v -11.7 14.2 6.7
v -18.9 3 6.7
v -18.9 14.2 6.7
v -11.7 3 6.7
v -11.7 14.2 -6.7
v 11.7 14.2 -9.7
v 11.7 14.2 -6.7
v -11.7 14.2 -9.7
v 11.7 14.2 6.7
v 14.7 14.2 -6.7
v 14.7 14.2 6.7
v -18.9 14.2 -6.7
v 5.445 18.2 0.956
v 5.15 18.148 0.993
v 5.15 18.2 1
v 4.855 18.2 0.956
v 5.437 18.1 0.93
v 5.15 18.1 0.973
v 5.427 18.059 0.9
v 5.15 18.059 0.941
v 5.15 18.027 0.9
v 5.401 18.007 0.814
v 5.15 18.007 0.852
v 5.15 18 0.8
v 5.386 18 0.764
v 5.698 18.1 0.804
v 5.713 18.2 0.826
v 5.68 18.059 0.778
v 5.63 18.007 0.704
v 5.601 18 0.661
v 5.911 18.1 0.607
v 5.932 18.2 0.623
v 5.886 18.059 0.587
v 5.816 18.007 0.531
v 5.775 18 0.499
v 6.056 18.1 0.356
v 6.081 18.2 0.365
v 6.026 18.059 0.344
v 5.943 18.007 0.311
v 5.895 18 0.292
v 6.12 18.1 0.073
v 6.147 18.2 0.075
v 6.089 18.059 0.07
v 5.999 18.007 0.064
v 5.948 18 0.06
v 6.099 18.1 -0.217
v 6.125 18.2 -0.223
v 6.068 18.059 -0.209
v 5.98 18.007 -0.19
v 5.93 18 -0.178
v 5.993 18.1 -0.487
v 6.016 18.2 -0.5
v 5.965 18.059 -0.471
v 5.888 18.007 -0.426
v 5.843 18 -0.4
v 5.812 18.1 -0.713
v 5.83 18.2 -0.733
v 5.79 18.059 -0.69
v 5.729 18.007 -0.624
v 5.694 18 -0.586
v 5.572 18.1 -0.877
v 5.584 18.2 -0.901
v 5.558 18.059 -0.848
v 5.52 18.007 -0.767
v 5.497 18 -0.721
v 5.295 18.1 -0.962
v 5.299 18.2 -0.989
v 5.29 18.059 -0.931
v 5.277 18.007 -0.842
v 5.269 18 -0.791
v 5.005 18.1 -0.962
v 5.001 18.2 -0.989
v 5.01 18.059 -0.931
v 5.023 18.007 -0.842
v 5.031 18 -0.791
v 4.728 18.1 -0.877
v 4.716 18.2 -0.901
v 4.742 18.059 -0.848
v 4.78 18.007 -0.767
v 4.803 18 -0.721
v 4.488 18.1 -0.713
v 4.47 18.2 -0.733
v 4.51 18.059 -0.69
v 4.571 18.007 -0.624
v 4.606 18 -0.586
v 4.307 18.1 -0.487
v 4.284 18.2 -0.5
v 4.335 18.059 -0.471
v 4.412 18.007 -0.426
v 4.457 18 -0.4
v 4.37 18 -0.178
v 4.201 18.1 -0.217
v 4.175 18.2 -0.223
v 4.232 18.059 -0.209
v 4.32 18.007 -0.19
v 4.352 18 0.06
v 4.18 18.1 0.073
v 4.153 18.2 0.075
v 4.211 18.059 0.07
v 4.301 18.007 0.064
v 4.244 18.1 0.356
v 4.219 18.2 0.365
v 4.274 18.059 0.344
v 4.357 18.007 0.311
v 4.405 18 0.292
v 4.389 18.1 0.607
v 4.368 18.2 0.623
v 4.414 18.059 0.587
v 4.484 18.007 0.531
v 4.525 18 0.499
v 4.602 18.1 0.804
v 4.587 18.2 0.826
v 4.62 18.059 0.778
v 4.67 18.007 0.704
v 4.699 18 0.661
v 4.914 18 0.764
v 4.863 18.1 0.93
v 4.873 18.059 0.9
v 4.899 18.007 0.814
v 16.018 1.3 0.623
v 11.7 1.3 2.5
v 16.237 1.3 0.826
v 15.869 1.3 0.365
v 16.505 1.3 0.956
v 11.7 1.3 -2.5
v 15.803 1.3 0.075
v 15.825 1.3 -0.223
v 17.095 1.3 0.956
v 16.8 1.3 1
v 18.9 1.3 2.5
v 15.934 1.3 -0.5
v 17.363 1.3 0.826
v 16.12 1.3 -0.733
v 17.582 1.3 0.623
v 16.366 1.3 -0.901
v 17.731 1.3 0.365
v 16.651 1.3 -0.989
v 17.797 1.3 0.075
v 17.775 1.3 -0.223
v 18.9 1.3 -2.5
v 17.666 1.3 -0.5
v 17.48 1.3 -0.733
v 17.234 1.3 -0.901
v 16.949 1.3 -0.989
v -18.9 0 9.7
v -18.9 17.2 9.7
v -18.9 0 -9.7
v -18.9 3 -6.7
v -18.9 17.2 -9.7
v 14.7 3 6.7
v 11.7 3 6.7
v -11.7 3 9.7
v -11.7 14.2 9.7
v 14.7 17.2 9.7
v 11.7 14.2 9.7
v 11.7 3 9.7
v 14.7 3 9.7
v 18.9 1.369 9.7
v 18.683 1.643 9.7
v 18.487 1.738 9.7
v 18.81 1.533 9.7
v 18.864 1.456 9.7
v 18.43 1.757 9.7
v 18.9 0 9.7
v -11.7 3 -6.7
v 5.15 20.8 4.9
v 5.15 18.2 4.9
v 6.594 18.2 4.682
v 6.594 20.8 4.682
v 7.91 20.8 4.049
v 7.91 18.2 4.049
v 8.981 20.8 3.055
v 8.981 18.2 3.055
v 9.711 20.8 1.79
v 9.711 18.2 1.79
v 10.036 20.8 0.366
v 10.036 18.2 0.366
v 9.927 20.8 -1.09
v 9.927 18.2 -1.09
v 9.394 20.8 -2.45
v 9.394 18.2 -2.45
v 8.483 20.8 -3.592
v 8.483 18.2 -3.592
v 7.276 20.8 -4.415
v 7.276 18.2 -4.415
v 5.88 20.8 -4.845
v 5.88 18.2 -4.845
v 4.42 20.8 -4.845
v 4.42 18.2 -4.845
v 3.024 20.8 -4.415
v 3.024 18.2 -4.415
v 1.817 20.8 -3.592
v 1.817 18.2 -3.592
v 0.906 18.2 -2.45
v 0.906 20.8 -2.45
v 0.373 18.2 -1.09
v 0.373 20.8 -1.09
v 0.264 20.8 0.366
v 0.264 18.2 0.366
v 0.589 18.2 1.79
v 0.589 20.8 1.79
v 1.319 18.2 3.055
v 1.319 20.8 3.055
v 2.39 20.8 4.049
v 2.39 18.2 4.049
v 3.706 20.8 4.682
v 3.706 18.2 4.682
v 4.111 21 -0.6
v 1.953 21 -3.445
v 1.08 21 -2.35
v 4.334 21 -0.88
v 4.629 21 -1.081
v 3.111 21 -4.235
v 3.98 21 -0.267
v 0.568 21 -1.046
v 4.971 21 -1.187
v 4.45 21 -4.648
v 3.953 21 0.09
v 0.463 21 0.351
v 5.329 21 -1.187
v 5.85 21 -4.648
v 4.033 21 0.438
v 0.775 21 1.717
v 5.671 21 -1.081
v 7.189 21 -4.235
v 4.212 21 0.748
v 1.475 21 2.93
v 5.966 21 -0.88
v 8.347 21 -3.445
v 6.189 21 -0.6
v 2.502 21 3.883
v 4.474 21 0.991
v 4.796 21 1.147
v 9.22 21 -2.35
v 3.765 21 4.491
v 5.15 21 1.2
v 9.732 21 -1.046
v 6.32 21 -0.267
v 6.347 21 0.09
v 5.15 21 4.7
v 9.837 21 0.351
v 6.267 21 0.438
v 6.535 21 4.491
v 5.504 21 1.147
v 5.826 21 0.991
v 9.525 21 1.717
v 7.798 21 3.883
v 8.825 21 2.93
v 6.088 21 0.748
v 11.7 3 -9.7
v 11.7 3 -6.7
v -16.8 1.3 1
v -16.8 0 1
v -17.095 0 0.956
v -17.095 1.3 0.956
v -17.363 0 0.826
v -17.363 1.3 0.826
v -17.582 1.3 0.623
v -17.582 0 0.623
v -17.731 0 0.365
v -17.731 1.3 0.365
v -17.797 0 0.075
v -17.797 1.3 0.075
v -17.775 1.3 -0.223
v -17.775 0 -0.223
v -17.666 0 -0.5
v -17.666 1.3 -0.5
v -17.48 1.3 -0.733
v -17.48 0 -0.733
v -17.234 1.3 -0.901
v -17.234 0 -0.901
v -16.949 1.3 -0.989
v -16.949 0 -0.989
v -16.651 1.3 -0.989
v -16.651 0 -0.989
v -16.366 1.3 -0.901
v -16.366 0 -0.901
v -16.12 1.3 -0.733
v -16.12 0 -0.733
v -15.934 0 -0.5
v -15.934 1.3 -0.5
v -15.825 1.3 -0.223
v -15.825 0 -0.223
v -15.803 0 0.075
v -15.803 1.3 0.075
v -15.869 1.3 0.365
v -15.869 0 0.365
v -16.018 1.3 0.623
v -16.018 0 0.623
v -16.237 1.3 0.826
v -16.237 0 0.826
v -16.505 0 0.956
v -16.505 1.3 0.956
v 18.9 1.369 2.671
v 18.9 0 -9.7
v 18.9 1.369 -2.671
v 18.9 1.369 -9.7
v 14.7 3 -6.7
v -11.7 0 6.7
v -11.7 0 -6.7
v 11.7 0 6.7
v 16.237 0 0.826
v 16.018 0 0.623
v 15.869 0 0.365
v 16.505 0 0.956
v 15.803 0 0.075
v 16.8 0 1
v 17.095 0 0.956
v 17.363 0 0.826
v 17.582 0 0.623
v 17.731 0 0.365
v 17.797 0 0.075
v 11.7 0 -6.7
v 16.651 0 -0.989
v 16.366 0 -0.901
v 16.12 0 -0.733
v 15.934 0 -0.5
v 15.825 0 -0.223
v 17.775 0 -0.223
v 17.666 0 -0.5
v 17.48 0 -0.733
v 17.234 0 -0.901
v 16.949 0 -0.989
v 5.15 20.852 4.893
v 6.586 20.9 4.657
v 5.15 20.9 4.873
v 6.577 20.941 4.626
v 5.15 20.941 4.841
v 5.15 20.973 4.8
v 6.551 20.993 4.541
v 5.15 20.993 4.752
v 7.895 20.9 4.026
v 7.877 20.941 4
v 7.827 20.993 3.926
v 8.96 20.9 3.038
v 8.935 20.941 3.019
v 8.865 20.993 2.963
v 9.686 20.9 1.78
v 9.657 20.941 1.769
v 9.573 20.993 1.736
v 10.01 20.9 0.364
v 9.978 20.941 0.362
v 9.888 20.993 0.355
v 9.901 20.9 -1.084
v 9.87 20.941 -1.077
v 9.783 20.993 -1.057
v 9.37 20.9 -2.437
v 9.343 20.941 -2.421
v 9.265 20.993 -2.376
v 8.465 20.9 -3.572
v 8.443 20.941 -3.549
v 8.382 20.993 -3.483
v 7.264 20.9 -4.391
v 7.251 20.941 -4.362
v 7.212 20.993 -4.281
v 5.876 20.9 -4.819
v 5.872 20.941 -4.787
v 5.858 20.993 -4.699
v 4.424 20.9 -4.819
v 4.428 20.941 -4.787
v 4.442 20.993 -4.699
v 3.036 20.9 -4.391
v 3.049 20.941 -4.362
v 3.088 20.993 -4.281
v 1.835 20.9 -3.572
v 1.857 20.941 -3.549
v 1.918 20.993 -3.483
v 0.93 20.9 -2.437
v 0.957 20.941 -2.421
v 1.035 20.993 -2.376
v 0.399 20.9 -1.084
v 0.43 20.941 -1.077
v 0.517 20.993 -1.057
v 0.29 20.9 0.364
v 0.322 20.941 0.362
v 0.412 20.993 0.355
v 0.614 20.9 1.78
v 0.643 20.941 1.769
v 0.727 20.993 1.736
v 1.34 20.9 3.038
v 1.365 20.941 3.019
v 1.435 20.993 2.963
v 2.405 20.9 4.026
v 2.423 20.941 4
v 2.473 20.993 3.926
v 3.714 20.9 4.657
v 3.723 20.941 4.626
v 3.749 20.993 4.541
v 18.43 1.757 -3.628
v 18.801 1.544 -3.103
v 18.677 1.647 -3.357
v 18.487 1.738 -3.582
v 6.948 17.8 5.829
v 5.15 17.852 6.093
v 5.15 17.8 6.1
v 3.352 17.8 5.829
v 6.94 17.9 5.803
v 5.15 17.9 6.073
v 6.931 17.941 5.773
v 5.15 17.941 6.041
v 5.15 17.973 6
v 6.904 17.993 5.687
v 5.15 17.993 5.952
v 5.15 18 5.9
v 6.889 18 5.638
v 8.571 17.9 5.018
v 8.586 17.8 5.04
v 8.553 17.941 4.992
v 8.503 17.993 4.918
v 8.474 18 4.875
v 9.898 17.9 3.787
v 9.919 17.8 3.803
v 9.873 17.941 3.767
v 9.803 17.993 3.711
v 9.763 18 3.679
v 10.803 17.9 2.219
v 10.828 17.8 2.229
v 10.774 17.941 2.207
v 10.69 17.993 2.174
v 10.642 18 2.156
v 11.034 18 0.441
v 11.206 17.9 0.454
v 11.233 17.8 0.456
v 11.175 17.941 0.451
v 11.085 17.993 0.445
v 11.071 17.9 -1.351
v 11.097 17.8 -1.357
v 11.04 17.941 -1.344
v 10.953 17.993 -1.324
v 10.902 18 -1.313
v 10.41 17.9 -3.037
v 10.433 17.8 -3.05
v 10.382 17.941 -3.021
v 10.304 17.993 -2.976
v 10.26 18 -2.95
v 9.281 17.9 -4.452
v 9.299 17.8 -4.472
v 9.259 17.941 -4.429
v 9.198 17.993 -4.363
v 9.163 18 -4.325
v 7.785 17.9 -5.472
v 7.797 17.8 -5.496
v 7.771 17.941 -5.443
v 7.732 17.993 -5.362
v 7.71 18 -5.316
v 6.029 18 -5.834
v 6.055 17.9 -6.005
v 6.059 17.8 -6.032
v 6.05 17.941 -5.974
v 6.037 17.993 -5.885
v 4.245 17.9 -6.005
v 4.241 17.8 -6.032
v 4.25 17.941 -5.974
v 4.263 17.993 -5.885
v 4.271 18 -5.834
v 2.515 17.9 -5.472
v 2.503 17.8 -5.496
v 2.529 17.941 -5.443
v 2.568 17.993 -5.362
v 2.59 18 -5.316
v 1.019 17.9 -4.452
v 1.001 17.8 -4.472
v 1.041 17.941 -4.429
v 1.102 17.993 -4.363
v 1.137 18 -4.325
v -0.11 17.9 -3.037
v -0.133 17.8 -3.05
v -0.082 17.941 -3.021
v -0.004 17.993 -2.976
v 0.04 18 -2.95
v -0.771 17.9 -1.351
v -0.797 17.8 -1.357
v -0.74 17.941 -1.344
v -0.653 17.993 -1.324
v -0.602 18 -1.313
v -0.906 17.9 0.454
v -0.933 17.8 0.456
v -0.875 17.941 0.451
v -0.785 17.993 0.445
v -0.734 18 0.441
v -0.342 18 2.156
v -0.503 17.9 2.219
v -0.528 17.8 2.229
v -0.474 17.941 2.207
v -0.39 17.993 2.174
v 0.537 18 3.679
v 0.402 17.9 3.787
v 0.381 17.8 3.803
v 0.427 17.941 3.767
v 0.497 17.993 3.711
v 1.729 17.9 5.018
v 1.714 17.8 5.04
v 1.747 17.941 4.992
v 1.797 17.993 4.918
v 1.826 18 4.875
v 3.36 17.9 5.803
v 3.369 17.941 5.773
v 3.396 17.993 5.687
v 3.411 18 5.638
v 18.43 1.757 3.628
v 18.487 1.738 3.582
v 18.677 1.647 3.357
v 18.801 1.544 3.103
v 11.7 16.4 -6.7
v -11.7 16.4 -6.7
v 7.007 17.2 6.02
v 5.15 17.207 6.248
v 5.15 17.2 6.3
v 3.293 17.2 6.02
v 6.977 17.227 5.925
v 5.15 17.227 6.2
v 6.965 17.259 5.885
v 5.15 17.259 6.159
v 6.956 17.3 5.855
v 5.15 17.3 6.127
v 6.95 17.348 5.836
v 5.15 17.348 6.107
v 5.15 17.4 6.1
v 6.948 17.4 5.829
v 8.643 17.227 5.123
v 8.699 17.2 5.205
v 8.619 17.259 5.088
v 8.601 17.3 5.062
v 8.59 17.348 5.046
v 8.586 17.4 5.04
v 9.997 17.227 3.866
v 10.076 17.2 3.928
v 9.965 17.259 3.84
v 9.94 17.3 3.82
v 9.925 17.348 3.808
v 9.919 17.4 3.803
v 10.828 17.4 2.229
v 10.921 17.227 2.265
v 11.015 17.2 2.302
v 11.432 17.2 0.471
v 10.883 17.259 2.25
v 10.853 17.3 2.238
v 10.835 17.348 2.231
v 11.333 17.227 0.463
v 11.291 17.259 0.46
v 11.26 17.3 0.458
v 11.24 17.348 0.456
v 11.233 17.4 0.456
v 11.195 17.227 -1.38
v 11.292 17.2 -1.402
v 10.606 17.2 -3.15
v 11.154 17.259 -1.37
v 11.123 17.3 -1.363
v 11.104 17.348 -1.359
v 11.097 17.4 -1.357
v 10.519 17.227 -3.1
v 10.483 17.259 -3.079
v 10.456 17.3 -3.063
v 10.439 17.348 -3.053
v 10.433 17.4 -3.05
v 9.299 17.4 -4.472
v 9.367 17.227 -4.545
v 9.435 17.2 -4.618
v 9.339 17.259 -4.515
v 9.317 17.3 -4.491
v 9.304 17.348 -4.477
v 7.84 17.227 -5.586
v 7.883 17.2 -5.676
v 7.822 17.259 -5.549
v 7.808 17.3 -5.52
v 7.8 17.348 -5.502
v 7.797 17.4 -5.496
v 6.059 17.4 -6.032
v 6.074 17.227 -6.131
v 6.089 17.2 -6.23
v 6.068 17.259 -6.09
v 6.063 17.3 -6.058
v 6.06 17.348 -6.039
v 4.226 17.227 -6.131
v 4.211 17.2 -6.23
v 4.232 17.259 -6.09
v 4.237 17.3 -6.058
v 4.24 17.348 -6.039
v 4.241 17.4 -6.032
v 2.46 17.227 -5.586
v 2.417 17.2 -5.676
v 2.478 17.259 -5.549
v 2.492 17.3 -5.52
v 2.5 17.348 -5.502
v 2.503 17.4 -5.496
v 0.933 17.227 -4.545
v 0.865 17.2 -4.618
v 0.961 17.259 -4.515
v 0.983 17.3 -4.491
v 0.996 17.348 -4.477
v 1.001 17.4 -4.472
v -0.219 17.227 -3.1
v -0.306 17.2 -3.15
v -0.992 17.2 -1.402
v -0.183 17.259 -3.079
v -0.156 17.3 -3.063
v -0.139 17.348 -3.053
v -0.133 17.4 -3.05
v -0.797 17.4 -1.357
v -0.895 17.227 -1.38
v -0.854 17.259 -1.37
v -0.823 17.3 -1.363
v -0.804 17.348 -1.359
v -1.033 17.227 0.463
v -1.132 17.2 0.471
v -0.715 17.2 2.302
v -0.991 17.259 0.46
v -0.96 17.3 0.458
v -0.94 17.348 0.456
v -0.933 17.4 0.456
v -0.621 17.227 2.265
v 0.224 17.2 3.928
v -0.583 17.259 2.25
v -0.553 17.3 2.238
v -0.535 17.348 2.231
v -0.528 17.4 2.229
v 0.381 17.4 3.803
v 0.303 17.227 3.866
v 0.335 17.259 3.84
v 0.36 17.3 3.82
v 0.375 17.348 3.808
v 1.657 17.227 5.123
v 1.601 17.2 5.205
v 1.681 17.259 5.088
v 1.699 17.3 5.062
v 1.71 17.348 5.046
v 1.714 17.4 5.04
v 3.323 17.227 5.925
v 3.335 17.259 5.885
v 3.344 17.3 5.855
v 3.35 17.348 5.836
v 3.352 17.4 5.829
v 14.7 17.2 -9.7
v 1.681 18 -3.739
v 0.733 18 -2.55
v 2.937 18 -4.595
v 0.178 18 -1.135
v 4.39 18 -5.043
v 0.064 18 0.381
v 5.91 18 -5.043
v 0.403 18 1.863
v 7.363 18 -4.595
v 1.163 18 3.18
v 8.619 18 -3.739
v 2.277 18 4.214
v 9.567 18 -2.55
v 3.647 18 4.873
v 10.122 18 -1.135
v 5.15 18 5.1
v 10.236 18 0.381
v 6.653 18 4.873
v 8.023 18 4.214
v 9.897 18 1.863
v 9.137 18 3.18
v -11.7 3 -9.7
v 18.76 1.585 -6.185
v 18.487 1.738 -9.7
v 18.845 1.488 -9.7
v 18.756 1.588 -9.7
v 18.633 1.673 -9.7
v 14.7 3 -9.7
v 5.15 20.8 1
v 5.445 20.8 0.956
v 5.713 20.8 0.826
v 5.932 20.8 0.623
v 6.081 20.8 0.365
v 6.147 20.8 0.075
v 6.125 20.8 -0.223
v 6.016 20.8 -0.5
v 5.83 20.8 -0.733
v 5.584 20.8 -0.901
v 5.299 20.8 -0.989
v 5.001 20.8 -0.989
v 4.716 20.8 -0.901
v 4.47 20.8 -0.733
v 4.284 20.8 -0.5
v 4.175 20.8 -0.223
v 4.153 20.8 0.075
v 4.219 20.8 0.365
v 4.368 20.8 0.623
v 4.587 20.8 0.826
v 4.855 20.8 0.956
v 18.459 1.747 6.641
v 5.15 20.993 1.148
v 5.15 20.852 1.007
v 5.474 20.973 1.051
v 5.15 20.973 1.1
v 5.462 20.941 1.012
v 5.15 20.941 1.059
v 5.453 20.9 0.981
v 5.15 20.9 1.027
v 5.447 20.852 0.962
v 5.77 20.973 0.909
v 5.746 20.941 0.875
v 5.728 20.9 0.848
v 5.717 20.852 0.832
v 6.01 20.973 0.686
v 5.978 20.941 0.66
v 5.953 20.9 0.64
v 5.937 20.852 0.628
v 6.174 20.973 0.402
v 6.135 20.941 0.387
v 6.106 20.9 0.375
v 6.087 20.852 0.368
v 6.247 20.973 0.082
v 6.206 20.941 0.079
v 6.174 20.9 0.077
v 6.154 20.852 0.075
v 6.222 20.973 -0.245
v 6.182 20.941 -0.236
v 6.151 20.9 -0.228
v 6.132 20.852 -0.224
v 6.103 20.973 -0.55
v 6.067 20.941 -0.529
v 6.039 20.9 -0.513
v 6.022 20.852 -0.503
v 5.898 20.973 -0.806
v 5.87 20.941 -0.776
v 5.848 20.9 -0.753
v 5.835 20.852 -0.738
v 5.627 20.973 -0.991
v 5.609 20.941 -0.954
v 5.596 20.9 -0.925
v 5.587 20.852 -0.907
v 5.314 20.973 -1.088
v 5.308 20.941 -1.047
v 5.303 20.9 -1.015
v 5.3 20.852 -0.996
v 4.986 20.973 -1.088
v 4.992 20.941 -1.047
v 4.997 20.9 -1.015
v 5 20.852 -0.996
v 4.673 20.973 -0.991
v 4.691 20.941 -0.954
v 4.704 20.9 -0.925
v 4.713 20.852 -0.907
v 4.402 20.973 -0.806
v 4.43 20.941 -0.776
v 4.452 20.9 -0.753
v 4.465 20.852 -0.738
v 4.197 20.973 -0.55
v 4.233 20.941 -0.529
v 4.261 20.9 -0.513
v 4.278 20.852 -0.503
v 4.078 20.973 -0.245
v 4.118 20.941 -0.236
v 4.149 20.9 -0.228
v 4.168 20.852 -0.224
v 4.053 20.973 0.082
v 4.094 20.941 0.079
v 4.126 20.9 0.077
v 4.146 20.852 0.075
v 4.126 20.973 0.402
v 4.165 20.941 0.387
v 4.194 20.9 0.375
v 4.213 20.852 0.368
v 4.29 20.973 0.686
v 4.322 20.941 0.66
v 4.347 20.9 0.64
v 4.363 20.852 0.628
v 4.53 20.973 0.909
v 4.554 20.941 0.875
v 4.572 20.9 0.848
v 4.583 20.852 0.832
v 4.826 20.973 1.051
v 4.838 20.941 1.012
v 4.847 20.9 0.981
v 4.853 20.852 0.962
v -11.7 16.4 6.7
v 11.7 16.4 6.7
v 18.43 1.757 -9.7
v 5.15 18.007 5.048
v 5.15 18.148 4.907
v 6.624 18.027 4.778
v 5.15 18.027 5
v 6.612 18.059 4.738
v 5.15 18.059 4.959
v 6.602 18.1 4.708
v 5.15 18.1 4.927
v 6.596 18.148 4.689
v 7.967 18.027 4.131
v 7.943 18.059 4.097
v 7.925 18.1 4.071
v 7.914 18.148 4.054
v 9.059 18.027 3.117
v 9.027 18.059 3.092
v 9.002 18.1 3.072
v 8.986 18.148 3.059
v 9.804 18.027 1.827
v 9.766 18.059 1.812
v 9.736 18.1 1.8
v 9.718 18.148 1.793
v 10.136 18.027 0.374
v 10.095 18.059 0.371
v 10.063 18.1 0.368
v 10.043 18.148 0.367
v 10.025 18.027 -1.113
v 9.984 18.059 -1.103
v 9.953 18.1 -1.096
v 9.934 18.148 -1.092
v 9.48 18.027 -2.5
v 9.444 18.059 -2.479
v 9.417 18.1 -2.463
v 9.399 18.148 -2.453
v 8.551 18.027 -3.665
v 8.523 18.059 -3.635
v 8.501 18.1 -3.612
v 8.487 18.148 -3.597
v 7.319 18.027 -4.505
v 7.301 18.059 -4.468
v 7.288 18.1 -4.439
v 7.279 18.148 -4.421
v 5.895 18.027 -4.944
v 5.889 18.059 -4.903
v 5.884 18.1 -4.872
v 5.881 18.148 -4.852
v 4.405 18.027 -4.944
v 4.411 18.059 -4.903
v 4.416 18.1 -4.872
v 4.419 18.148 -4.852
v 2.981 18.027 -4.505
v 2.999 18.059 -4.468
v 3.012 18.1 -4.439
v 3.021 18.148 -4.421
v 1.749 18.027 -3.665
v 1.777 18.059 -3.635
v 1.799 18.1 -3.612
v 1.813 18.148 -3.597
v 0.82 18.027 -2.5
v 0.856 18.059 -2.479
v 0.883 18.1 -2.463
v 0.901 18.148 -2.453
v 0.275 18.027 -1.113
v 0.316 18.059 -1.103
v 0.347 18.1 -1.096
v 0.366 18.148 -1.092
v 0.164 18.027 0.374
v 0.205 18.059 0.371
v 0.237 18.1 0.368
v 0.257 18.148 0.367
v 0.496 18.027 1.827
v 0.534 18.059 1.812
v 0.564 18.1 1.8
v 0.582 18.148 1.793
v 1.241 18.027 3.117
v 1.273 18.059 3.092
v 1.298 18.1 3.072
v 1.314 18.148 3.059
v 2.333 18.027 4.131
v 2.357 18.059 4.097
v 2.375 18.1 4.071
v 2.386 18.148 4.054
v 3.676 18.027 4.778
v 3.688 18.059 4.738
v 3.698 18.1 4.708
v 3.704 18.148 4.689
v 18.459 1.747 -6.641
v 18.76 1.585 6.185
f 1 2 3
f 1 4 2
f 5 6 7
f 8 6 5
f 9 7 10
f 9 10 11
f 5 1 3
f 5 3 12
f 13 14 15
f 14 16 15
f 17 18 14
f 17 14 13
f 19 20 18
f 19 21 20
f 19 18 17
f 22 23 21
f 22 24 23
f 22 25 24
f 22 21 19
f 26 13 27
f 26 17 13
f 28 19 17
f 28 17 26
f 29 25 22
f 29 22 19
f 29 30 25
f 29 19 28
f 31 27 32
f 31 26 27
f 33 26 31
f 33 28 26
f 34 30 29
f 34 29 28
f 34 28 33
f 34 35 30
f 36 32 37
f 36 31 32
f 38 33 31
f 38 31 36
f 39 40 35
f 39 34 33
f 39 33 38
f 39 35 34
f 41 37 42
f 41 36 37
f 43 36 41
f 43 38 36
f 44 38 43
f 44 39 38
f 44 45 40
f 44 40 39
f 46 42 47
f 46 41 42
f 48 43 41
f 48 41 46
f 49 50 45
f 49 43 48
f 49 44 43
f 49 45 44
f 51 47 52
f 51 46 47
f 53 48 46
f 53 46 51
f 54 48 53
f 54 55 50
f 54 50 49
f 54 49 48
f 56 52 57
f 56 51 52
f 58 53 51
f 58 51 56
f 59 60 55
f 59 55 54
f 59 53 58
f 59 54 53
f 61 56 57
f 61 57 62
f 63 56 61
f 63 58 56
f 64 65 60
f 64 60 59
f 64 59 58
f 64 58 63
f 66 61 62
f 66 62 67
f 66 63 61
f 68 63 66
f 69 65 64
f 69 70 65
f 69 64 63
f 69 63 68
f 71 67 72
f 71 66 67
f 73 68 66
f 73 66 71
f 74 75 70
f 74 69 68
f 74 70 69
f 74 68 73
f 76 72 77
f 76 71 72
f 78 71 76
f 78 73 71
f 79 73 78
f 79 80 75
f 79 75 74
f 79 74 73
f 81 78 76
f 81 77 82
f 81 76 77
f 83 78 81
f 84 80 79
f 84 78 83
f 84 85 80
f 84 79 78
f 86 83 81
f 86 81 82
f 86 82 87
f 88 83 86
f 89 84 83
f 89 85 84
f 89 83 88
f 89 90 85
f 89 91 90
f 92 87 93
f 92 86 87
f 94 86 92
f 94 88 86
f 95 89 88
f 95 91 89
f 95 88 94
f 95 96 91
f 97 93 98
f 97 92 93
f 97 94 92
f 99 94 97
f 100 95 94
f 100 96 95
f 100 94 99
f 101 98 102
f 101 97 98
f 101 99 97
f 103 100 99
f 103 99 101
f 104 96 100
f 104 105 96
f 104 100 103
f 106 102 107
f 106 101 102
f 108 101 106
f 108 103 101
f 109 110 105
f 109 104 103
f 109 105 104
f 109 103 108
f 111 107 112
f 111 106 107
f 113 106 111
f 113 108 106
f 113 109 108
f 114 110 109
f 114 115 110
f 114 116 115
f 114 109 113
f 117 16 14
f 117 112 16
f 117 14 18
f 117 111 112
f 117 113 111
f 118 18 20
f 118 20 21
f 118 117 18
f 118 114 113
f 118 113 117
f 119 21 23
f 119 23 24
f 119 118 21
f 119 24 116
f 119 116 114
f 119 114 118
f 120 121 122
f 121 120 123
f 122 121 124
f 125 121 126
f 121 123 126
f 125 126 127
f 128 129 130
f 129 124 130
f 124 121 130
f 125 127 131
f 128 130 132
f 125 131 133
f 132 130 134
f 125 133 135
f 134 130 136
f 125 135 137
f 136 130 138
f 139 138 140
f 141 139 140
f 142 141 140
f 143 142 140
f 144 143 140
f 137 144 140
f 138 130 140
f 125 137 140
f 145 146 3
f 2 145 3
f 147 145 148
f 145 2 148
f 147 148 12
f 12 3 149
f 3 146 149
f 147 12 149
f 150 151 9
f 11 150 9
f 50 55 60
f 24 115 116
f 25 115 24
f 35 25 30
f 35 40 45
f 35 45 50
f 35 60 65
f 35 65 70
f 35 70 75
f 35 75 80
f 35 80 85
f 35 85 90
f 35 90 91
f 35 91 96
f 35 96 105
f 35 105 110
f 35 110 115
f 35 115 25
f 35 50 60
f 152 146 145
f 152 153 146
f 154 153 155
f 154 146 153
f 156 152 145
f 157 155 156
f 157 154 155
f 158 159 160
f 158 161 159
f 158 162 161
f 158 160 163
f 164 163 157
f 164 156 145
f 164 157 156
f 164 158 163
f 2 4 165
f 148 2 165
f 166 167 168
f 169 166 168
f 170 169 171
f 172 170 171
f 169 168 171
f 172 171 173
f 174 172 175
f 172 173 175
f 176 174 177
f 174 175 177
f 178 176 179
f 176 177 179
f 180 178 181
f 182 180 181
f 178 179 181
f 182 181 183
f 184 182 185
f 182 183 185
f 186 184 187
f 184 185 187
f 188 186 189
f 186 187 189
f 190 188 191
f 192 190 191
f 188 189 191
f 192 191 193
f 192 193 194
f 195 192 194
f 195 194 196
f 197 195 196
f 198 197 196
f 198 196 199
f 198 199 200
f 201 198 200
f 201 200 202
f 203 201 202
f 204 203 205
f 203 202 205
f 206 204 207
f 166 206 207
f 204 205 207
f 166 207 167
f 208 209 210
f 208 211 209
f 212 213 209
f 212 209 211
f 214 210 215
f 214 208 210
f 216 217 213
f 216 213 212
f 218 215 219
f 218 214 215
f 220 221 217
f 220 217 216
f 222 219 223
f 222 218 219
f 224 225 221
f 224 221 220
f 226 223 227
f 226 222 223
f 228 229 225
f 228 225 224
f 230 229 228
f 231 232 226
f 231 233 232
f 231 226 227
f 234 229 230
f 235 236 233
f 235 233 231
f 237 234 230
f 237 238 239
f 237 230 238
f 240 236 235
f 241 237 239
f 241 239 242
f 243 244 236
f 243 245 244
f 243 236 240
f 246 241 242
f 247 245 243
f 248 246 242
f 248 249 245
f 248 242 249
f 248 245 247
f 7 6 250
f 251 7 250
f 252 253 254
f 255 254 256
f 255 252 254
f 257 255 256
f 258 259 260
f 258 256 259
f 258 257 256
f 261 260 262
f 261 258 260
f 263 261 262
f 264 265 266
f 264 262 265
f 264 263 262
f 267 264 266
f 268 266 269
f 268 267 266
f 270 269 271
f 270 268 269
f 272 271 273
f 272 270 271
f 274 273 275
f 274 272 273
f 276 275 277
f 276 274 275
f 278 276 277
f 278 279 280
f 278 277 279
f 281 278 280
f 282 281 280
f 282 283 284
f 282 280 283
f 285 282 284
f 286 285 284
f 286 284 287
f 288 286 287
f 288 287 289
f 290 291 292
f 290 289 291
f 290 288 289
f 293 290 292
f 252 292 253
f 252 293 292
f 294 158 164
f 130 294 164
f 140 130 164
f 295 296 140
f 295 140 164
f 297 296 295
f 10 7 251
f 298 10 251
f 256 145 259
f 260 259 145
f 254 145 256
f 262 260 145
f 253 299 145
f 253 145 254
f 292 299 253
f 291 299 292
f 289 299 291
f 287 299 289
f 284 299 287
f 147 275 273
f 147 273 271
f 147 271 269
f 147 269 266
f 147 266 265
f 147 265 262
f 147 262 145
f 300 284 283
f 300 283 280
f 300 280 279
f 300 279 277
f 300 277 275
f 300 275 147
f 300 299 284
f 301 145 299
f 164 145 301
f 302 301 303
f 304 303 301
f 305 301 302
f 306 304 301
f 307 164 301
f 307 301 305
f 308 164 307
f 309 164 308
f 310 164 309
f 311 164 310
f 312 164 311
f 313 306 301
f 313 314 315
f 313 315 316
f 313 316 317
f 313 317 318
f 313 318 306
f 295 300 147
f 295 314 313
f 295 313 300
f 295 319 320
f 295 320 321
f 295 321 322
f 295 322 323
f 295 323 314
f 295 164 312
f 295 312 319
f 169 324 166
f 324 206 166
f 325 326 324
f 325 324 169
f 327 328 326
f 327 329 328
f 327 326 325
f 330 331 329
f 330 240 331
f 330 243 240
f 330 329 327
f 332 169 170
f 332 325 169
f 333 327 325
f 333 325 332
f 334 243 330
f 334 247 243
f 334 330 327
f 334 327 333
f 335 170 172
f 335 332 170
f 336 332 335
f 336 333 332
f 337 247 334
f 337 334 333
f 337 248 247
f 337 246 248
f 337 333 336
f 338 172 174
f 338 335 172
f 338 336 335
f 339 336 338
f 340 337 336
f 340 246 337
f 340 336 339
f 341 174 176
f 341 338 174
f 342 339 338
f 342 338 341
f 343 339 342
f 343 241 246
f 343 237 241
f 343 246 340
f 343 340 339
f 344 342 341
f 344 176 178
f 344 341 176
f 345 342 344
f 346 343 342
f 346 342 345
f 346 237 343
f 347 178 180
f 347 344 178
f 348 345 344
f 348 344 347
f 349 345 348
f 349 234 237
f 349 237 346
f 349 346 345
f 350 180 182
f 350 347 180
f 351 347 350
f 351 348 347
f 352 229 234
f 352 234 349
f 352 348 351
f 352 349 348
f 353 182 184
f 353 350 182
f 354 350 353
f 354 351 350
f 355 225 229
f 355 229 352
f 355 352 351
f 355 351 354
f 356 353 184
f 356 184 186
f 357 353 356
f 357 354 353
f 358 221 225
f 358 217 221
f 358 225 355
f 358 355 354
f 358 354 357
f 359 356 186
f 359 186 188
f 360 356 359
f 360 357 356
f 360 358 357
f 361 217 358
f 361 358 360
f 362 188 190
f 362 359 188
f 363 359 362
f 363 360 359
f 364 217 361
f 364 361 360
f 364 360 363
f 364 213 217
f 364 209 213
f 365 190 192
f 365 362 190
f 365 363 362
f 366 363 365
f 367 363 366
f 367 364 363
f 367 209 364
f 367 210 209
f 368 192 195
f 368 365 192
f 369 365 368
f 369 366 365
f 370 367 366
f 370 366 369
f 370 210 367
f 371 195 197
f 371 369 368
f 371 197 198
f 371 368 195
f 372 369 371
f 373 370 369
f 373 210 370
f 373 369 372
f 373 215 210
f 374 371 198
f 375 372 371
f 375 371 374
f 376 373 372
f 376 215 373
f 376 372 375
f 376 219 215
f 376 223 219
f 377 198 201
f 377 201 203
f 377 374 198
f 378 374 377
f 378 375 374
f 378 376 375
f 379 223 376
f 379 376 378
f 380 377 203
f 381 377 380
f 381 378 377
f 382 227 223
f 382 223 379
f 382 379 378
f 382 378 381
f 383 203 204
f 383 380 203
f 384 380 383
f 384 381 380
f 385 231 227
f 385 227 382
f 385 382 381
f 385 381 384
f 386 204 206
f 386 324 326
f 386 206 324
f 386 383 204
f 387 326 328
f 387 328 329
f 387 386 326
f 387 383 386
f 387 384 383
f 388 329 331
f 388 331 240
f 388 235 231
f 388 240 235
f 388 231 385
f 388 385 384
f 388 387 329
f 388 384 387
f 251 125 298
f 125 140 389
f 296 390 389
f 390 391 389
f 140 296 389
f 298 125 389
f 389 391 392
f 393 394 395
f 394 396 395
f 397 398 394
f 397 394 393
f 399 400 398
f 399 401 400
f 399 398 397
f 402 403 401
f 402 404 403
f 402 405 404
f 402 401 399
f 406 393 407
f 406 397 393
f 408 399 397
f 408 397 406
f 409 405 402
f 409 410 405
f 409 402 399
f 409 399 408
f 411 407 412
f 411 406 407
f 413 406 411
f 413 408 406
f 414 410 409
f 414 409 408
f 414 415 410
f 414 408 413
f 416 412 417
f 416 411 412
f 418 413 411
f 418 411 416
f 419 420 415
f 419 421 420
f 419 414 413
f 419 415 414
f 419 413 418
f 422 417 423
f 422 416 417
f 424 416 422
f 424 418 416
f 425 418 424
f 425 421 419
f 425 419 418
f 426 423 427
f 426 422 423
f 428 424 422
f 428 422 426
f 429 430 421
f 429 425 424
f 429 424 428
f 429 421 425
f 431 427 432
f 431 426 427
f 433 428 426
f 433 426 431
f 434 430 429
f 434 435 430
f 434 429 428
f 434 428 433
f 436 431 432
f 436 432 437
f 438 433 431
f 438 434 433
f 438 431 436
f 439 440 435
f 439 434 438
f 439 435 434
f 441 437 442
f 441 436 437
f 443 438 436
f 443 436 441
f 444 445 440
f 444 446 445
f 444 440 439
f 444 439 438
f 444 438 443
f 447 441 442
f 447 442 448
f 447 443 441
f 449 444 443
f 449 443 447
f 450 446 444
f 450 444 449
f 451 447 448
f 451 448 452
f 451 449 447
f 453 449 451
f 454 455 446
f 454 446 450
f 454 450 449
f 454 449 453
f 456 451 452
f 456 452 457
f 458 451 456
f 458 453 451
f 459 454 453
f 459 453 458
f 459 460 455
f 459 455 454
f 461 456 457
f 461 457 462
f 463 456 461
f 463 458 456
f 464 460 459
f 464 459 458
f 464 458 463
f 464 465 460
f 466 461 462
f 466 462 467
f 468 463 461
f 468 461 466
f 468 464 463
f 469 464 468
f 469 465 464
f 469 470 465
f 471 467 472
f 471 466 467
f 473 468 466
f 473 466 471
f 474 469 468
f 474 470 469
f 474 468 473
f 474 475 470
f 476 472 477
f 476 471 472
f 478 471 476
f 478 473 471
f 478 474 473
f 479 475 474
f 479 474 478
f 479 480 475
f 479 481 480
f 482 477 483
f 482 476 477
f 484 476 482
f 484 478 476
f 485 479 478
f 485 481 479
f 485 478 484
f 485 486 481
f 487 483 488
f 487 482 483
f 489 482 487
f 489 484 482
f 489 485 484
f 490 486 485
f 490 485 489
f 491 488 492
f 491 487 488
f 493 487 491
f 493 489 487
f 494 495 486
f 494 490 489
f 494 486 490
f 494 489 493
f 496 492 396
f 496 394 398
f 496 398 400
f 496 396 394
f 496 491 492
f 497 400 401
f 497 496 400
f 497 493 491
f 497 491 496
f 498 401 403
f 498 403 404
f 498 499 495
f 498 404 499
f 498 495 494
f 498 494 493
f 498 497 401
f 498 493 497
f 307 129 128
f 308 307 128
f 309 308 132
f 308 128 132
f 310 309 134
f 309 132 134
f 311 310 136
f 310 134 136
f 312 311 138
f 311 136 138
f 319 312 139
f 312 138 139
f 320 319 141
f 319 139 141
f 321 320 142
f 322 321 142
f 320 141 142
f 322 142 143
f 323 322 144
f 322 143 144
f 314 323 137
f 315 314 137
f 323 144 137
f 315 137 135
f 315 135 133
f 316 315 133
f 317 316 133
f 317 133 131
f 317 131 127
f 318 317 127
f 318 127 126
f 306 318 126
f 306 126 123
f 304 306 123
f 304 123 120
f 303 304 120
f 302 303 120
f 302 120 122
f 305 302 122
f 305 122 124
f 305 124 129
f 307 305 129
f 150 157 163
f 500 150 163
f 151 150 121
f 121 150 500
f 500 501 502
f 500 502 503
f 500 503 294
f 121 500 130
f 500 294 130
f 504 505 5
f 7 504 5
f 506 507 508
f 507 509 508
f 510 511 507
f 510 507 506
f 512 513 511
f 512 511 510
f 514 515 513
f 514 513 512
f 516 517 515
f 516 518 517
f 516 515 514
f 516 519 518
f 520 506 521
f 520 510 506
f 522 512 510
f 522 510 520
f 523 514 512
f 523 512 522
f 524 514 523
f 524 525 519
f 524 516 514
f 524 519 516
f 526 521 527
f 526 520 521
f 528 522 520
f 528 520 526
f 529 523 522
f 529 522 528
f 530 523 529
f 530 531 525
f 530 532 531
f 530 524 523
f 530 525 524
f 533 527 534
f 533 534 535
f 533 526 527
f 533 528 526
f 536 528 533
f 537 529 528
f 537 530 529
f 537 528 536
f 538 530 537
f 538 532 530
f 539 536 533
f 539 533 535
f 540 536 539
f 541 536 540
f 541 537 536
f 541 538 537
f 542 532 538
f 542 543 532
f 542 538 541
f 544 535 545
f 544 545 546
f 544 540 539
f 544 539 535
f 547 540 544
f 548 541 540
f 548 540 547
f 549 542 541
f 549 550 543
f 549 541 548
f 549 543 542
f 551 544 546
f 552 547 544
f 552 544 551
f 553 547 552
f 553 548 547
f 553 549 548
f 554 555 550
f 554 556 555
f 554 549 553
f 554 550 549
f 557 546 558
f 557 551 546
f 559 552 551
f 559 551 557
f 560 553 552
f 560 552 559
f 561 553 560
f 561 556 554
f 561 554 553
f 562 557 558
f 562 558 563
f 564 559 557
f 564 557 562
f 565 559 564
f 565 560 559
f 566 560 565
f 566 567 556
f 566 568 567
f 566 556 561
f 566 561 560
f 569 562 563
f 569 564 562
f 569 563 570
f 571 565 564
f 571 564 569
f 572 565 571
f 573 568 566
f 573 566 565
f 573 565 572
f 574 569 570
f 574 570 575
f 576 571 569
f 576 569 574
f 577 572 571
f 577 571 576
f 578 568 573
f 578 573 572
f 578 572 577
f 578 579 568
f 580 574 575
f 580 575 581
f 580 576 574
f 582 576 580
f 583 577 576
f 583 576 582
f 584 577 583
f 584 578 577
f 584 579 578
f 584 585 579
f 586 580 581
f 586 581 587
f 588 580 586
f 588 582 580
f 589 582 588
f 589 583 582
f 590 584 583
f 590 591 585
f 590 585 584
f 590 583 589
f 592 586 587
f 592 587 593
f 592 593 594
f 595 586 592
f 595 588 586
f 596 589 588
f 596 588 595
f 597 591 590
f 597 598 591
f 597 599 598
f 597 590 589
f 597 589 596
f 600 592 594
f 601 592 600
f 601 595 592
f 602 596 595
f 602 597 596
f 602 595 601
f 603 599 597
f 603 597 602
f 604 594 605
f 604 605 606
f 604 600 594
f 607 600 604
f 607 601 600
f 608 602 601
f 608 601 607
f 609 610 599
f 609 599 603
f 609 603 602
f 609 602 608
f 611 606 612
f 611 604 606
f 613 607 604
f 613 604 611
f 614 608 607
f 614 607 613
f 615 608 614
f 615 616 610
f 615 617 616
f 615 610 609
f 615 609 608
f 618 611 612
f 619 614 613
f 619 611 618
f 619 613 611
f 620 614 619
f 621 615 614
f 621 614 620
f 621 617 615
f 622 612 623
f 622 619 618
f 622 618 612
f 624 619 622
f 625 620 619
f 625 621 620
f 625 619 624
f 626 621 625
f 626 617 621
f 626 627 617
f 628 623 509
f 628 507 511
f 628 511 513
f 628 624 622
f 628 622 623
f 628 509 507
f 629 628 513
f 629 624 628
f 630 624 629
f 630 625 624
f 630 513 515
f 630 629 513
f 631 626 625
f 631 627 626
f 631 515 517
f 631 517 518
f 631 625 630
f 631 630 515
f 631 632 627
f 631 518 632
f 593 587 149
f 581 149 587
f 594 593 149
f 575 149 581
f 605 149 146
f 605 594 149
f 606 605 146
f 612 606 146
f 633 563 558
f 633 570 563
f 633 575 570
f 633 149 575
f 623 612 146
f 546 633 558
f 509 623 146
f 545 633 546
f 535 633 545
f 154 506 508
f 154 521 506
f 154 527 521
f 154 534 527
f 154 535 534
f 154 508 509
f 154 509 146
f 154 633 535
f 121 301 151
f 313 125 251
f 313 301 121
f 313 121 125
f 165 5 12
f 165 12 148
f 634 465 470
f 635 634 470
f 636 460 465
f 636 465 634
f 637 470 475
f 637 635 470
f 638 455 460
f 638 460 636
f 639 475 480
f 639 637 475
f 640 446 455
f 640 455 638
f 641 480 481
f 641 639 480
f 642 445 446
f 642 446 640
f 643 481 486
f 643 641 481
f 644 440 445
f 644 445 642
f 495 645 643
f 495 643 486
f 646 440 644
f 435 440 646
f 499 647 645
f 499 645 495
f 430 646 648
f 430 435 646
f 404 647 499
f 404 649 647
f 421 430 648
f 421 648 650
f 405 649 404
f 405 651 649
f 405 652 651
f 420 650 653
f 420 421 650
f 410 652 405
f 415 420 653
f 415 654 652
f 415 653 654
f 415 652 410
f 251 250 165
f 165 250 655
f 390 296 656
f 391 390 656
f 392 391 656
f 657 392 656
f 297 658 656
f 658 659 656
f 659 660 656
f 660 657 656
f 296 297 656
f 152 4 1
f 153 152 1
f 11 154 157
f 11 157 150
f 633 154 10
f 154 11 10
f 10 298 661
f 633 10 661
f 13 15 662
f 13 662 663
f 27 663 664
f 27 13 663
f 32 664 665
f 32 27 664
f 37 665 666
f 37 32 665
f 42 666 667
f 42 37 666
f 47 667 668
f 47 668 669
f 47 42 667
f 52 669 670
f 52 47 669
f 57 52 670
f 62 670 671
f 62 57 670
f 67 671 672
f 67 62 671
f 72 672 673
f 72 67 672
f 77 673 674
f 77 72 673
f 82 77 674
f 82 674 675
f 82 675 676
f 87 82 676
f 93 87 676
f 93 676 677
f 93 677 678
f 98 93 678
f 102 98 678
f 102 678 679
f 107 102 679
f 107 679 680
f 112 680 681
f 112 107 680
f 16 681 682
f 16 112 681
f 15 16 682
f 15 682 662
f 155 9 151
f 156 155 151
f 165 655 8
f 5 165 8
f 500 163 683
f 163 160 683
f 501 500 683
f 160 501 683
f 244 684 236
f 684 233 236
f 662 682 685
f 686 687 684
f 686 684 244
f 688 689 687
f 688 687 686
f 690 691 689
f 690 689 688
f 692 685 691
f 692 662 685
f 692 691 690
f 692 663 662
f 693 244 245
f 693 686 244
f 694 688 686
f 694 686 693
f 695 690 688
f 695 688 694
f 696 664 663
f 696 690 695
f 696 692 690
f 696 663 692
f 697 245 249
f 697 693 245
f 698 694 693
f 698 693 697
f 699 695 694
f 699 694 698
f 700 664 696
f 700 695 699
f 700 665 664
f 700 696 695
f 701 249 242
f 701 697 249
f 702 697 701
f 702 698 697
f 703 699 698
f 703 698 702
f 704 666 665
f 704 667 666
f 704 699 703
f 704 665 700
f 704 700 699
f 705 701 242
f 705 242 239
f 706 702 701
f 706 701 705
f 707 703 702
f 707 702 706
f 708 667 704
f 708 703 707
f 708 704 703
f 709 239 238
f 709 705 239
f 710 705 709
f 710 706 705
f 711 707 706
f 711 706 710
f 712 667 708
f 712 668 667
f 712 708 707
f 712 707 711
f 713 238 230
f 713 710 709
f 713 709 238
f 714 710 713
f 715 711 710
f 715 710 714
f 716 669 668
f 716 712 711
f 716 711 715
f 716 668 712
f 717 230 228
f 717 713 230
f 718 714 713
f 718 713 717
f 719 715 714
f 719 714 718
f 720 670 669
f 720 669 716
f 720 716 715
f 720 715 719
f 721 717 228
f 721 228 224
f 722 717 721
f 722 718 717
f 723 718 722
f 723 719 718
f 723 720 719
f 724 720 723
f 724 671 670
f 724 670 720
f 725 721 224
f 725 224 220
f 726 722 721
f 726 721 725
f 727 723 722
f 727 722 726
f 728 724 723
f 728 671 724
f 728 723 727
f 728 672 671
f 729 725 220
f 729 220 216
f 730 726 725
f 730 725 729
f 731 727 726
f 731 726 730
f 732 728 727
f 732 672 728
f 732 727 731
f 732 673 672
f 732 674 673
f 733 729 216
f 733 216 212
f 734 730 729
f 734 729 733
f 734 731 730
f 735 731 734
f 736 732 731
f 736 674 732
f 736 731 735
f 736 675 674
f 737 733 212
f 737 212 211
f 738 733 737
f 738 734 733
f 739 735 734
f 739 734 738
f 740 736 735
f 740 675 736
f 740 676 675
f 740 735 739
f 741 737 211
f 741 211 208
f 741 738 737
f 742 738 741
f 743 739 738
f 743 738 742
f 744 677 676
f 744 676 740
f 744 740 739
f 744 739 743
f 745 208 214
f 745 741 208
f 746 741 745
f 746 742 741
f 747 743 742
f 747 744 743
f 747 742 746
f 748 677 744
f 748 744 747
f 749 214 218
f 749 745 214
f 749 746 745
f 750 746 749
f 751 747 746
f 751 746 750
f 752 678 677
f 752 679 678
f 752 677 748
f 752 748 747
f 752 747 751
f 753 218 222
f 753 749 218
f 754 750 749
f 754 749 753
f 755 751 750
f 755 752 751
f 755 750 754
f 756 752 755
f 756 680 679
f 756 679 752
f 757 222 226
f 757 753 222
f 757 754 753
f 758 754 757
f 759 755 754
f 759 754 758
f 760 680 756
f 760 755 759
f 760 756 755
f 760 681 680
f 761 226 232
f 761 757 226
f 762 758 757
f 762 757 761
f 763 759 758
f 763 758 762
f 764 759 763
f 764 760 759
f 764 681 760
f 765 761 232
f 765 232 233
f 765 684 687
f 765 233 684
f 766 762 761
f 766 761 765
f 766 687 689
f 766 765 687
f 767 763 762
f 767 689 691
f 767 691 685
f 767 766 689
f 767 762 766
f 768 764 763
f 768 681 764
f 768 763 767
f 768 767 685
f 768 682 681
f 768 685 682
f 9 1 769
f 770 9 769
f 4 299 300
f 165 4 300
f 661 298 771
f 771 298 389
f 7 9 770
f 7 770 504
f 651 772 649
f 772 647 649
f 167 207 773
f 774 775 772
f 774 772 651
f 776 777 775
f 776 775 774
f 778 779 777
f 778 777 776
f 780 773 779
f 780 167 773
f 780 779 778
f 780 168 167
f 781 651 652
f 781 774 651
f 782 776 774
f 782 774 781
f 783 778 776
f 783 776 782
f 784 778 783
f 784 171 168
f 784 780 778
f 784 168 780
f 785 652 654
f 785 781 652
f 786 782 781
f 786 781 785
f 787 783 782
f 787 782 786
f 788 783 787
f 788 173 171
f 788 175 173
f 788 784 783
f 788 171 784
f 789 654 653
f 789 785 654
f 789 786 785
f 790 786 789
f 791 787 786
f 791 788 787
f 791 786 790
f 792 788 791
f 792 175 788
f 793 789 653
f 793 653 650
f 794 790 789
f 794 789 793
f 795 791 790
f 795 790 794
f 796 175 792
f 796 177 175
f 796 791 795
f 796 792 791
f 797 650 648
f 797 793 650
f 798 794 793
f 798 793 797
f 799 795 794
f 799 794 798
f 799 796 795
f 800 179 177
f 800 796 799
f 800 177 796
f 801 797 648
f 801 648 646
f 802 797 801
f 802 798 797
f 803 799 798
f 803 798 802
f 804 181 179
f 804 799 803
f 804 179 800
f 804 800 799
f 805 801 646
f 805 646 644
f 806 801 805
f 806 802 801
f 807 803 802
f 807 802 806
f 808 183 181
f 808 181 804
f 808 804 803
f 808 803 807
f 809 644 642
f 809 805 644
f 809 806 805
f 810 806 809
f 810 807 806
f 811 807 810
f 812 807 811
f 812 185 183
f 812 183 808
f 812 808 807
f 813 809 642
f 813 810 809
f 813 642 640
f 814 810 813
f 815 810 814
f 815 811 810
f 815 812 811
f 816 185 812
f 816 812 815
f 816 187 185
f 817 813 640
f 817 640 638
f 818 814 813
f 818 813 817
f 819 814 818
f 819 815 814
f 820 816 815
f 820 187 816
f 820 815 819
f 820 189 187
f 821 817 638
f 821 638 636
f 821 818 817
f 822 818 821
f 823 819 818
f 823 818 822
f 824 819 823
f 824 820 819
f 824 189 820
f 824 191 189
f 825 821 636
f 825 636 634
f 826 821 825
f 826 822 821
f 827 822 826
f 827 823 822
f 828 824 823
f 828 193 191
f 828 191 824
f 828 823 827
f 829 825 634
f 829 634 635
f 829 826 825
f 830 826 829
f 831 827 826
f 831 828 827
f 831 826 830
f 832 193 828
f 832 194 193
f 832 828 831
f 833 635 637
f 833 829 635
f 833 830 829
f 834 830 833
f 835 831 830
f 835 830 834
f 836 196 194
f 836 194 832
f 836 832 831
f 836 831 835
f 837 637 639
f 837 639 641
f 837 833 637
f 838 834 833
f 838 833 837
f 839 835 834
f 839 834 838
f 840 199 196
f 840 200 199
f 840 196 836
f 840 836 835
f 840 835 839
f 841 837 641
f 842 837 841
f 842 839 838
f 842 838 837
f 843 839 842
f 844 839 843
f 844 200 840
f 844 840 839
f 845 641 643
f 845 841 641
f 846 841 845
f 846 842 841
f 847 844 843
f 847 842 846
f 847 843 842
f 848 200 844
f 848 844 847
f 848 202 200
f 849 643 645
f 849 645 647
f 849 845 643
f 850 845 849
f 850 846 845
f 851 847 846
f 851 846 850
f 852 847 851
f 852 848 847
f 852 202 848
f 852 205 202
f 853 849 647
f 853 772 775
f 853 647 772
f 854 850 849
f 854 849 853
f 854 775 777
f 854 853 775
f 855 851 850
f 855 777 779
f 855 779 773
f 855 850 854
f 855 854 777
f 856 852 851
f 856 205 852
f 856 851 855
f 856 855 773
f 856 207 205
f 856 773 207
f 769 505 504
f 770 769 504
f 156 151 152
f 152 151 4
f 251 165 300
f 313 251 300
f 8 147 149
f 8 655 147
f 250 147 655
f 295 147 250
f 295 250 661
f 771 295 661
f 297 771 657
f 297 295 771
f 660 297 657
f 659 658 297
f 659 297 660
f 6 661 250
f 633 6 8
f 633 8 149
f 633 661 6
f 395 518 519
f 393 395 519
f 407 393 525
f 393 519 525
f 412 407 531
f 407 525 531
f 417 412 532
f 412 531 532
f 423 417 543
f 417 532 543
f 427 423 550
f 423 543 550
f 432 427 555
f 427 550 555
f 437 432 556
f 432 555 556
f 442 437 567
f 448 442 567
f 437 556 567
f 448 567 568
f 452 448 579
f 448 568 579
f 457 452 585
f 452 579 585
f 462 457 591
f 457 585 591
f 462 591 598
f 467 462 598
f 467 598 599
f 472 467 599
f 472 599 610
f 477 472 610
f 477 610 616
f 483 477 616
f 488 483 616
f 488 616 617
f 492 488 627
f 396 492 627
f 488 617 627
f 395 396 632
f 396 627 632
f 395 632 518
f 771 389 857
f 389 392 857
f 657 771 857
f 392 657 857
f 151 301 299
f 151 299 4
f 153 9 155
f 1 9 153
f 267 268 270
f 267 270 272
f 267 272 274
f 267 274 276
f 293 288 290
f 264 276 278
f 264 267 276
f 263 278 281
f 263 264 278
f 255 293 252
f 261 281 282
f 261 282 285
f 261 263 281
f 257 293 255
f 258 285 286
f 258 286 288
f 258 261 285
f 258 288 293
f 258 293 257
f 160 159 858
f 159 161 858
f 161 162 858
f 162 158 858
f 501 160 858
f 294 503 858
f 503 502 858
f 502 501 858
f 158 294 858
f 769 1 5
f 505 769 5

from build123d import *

# Parameters (mm, degrees)
SKETCH_1_W          = 29.4
SKETCH_1_H          = 19.4
SKETCH_1_W_2        = 23.4
SKETCH_1_H_2        = 13.4
EXTRUDE_1_DEPTH     = 16.4
SKETCH_2_W          = 29.4
SKETCH_2_H          = 19.4
EXTRUDE_2_DEPTH     = 0.8
SKETCH_3_R          = 6.1
EXTRUDE_3_DEPTH     = 0.8
SKETCH_5_R          = 4.9
SKETCH_5_R_2        = 1
EXTRUDE_4_DEPTH     = 3
FILLET_1_R          = 0.2
SKETCH_7_W          = 13.4
SKETCH_7_H          = 5.6
CUT_EXTRUDE_2_DEPTH = 30
SKETCH_8_W          = 23.4
SKETCH_8_H          = 5.6
CUT_EXTRUDE_3_DEPTH = 30
SKETCH_9_W          = 19.4
SKETCH_9_H          = 3
EXTRUDE_5_DEPTH     = 4.2
CUT_EXTRUDE_4_DEPTH = 20.2
CUT_EXTRUDE_5_DEPTH = 5.1
SKETCH_12_R         = 1
CUT_EXTRUDE_6_DEPTH = 2.2
EXTRUDE_6_DEPTH     = 4.2


with BuildPart() as part:
    # 草图1 → 凸台-拉伸1 (new body)
    with BuildSketch(Plane(origin=(0, 0, 0), x_dir=(1, 0, 0), z_dir=(0, 1, 0))):
        Rectangle(SKETCH_1_W, SKETCH_1_H)
        Rectangle(SKETCH_1_W_2, SKETCH_1_H_2, mode=Mode.SUBTRACT)
    extrude(amount=EXTRUDE_1_DEPTH)

    # 草图2 → 凸台-拉伸2 (add)
    with BuildSketch(Plane(origin=(0, 16.4, 0), x_dir=(1, 0, 0), z_dir=(0, 1, 0))):
        Rectangle(SKETCH_2_W, SKETCH_2_H)
    extrude(amount=EXTRUDE_2_DEPTH)

    # 草图3 → 凸台-拉伸3 (add)
    with BuildSketch(Plane(origin=(0, 17.2, 0), x_dir=(1, 0, 0), z_dir=(0, 1, 0))):
        with Locations(Location((5.15, 0, 0), (0, 0, 270))):
            Circle(SKETCH_3_R)
    extrude(amount=EXTRUDE_3_DEPTH)

    # 草图5 → 凸台-拉伸4 (add)
    with BuildSketch(Plane(origin=(0, 18, 0), x_dir=(1, 0, 0), z_dir=(0, 1, 0))):
        with Locations(Location((5.15, 0, 0), (0, 0, 270))):
            Circle(SKETCH_5_R)
        with Locations(Location((5.15, 0, 0), (0, 0, 270))):
            Circle(SKETCH_5_R_2, mode=Mode.SUBTRACT)
    extrude(amount=EXTRUDE_4_DEPTH)

    # 圆角1
    fillet_1_edges = [part.edges().sort_by_distance(p)[0] for p in [
        (5.15, 17.2, -6.1),
        (5.15, 18, -6.1),
        (5.15, 18, -1),
        (5.15, 21, -4.9),
        (5.15, 18, -4.9),
        (5.15, 21, -1),
    ]]
    fillet(fillet_1_edges, radius=FILLET_1_R)

    # 草图7 → 切除-拉伸2 (cut)
    with BuildSketch(Plane.ZY.offset(14.7)):
        with Locations((0, 11.4)):
            Rectangle(SKETCH_7_W, SKETCH_7_H)
        with Locations((0, 5.8)):
            Rectangle(SKETCH_7_W, SKETCH_7_H)
    extrude(amount=-CUT_EXTRUDE_2_DEPTH, mode=Mode.SUBTRACT)

    # 草图8 → 切除-拉伸3 (cut)
    with BuildSketch(Plane(origin=(0, 0, -9.7), x_dir=(-1, 0, 0), z_dir=(0, 0, -1))):
        with Locations((0, 11.4)):
            Rectangle(SKETCH_8_W, SKETCH_8_H)
        with Locations((0, 5.8)):
            Rectangle(SKETCH_8_W, SKETCH_8_H)
    extrude(amount=-CUT_EXTRUDE_3_DEPTH, mode=Mode.SUBTRACT)

    # 草图9 → 凸台-拉伸5 (add)
    with BuildSketch(Plane(origin=(14.7, 0, 0), x_dir=(0, 0, -1), z_dir=(1, 0, 0))):
        with Locations((0, 1.5)):
            Rectangle(SKETCH_9_W, SKETCH_9_H)
    extrude_5 = extrude(amount=EXTRUDE_5_DEPTH)

    # 草图10 → 切除-拉伸4 (cut)
    with BuildSketch(Plane.XY.offset(9.7)):
        with BuildLine():
            add(Edge.make_bspline(
                [(18.486644801, 1.737785066), (18.825886074, 1.616028978), (18.9, 1.36920832)],
                knots=[0.049557912, 0.049557912, 0.049557912, 0.659174515, 0.659174515, 0.659174515], degree=2))
            Line((18.9, 1.36920832), (18.9, 1.6))
            Line((18.9, 1.6), (18.9, 3))
            Line((18.9, 3), (14.7, 3))
            Line((14.7, 3), (18.429736397, 1.756754534))
            add(Edge.make_bspline(
                [(18.429736397, 1.756754534), (18.459066665, 1.747683054), (18.486644801, 1.737785066)],
                knots=[0, 0, 0, 0.049557912, 0.049557912, 0.049557912], degree=2))
        make_face()
    extrude(amount=-CUT_EXTRUDE_4_DEPTH, mode=Mode.SUBTRACT)

    # 草图11 → 切除-拉伸5 (cut, symmetric)
    with BuildSketch(Plane(origin=(14.7, 0, 0), x_dir=(0, 0, -1), z_dir=(1, 0, 0))):
        Polygon((2.5, 1.3), (6.7, 3), (-6.7, 3), (-2.5, 1.3), align=None)
    extrude(amount=CUT_EXTRUDE_5_DEPTH, both=True, mode=Mode.SUBTRACT)

    # 草图12 → 切除-拉伸6 (cut)
    with BuildSketch(Plane(origin=(0, 1.3, 0), x_dir=(1, 0, 0), z_dir=(0, 1, 0))):
        with Locations(Location((16.8, 0, 0), (0, 0, 270))):
            Circle(SKETCH_12_R)
    cut_extrude_6 = extrude(amount=-CUT_EXTRUDE_6_DEPTH, mode=Mode.SUBTRACT)

    # 镜向1: 凸台-拉伸5, 切除-拉伸6 across plane
    add(extrude_5.mirror(Plane(origin=(0, 0, 0), x_dir=(0, 0, 1), z_dir=(1, 0, 0))))
    add(cut_extrude_6.mirror(Plane(origin=(0, 0, 0), x_dir=(0, 0, 1), z_dir=(1, 0, 0))), mode=Mode.SUBTRACT)

    # 草图13 → 凸台-拉伸6 (add)
    with BuildSketch(Plane.ZY.offset(14.7)):
        Polygon((-6.7, 3), (-9.7, 3), (-9.7, 17.2), (9.7, 17.2), (9.7, 3), (6.7, 3), (6.7, 14.2), (-6.7, 14.2), align=None)
    extrude(amount=EXTRUDE_6_DEPTH)


solid = part.part
